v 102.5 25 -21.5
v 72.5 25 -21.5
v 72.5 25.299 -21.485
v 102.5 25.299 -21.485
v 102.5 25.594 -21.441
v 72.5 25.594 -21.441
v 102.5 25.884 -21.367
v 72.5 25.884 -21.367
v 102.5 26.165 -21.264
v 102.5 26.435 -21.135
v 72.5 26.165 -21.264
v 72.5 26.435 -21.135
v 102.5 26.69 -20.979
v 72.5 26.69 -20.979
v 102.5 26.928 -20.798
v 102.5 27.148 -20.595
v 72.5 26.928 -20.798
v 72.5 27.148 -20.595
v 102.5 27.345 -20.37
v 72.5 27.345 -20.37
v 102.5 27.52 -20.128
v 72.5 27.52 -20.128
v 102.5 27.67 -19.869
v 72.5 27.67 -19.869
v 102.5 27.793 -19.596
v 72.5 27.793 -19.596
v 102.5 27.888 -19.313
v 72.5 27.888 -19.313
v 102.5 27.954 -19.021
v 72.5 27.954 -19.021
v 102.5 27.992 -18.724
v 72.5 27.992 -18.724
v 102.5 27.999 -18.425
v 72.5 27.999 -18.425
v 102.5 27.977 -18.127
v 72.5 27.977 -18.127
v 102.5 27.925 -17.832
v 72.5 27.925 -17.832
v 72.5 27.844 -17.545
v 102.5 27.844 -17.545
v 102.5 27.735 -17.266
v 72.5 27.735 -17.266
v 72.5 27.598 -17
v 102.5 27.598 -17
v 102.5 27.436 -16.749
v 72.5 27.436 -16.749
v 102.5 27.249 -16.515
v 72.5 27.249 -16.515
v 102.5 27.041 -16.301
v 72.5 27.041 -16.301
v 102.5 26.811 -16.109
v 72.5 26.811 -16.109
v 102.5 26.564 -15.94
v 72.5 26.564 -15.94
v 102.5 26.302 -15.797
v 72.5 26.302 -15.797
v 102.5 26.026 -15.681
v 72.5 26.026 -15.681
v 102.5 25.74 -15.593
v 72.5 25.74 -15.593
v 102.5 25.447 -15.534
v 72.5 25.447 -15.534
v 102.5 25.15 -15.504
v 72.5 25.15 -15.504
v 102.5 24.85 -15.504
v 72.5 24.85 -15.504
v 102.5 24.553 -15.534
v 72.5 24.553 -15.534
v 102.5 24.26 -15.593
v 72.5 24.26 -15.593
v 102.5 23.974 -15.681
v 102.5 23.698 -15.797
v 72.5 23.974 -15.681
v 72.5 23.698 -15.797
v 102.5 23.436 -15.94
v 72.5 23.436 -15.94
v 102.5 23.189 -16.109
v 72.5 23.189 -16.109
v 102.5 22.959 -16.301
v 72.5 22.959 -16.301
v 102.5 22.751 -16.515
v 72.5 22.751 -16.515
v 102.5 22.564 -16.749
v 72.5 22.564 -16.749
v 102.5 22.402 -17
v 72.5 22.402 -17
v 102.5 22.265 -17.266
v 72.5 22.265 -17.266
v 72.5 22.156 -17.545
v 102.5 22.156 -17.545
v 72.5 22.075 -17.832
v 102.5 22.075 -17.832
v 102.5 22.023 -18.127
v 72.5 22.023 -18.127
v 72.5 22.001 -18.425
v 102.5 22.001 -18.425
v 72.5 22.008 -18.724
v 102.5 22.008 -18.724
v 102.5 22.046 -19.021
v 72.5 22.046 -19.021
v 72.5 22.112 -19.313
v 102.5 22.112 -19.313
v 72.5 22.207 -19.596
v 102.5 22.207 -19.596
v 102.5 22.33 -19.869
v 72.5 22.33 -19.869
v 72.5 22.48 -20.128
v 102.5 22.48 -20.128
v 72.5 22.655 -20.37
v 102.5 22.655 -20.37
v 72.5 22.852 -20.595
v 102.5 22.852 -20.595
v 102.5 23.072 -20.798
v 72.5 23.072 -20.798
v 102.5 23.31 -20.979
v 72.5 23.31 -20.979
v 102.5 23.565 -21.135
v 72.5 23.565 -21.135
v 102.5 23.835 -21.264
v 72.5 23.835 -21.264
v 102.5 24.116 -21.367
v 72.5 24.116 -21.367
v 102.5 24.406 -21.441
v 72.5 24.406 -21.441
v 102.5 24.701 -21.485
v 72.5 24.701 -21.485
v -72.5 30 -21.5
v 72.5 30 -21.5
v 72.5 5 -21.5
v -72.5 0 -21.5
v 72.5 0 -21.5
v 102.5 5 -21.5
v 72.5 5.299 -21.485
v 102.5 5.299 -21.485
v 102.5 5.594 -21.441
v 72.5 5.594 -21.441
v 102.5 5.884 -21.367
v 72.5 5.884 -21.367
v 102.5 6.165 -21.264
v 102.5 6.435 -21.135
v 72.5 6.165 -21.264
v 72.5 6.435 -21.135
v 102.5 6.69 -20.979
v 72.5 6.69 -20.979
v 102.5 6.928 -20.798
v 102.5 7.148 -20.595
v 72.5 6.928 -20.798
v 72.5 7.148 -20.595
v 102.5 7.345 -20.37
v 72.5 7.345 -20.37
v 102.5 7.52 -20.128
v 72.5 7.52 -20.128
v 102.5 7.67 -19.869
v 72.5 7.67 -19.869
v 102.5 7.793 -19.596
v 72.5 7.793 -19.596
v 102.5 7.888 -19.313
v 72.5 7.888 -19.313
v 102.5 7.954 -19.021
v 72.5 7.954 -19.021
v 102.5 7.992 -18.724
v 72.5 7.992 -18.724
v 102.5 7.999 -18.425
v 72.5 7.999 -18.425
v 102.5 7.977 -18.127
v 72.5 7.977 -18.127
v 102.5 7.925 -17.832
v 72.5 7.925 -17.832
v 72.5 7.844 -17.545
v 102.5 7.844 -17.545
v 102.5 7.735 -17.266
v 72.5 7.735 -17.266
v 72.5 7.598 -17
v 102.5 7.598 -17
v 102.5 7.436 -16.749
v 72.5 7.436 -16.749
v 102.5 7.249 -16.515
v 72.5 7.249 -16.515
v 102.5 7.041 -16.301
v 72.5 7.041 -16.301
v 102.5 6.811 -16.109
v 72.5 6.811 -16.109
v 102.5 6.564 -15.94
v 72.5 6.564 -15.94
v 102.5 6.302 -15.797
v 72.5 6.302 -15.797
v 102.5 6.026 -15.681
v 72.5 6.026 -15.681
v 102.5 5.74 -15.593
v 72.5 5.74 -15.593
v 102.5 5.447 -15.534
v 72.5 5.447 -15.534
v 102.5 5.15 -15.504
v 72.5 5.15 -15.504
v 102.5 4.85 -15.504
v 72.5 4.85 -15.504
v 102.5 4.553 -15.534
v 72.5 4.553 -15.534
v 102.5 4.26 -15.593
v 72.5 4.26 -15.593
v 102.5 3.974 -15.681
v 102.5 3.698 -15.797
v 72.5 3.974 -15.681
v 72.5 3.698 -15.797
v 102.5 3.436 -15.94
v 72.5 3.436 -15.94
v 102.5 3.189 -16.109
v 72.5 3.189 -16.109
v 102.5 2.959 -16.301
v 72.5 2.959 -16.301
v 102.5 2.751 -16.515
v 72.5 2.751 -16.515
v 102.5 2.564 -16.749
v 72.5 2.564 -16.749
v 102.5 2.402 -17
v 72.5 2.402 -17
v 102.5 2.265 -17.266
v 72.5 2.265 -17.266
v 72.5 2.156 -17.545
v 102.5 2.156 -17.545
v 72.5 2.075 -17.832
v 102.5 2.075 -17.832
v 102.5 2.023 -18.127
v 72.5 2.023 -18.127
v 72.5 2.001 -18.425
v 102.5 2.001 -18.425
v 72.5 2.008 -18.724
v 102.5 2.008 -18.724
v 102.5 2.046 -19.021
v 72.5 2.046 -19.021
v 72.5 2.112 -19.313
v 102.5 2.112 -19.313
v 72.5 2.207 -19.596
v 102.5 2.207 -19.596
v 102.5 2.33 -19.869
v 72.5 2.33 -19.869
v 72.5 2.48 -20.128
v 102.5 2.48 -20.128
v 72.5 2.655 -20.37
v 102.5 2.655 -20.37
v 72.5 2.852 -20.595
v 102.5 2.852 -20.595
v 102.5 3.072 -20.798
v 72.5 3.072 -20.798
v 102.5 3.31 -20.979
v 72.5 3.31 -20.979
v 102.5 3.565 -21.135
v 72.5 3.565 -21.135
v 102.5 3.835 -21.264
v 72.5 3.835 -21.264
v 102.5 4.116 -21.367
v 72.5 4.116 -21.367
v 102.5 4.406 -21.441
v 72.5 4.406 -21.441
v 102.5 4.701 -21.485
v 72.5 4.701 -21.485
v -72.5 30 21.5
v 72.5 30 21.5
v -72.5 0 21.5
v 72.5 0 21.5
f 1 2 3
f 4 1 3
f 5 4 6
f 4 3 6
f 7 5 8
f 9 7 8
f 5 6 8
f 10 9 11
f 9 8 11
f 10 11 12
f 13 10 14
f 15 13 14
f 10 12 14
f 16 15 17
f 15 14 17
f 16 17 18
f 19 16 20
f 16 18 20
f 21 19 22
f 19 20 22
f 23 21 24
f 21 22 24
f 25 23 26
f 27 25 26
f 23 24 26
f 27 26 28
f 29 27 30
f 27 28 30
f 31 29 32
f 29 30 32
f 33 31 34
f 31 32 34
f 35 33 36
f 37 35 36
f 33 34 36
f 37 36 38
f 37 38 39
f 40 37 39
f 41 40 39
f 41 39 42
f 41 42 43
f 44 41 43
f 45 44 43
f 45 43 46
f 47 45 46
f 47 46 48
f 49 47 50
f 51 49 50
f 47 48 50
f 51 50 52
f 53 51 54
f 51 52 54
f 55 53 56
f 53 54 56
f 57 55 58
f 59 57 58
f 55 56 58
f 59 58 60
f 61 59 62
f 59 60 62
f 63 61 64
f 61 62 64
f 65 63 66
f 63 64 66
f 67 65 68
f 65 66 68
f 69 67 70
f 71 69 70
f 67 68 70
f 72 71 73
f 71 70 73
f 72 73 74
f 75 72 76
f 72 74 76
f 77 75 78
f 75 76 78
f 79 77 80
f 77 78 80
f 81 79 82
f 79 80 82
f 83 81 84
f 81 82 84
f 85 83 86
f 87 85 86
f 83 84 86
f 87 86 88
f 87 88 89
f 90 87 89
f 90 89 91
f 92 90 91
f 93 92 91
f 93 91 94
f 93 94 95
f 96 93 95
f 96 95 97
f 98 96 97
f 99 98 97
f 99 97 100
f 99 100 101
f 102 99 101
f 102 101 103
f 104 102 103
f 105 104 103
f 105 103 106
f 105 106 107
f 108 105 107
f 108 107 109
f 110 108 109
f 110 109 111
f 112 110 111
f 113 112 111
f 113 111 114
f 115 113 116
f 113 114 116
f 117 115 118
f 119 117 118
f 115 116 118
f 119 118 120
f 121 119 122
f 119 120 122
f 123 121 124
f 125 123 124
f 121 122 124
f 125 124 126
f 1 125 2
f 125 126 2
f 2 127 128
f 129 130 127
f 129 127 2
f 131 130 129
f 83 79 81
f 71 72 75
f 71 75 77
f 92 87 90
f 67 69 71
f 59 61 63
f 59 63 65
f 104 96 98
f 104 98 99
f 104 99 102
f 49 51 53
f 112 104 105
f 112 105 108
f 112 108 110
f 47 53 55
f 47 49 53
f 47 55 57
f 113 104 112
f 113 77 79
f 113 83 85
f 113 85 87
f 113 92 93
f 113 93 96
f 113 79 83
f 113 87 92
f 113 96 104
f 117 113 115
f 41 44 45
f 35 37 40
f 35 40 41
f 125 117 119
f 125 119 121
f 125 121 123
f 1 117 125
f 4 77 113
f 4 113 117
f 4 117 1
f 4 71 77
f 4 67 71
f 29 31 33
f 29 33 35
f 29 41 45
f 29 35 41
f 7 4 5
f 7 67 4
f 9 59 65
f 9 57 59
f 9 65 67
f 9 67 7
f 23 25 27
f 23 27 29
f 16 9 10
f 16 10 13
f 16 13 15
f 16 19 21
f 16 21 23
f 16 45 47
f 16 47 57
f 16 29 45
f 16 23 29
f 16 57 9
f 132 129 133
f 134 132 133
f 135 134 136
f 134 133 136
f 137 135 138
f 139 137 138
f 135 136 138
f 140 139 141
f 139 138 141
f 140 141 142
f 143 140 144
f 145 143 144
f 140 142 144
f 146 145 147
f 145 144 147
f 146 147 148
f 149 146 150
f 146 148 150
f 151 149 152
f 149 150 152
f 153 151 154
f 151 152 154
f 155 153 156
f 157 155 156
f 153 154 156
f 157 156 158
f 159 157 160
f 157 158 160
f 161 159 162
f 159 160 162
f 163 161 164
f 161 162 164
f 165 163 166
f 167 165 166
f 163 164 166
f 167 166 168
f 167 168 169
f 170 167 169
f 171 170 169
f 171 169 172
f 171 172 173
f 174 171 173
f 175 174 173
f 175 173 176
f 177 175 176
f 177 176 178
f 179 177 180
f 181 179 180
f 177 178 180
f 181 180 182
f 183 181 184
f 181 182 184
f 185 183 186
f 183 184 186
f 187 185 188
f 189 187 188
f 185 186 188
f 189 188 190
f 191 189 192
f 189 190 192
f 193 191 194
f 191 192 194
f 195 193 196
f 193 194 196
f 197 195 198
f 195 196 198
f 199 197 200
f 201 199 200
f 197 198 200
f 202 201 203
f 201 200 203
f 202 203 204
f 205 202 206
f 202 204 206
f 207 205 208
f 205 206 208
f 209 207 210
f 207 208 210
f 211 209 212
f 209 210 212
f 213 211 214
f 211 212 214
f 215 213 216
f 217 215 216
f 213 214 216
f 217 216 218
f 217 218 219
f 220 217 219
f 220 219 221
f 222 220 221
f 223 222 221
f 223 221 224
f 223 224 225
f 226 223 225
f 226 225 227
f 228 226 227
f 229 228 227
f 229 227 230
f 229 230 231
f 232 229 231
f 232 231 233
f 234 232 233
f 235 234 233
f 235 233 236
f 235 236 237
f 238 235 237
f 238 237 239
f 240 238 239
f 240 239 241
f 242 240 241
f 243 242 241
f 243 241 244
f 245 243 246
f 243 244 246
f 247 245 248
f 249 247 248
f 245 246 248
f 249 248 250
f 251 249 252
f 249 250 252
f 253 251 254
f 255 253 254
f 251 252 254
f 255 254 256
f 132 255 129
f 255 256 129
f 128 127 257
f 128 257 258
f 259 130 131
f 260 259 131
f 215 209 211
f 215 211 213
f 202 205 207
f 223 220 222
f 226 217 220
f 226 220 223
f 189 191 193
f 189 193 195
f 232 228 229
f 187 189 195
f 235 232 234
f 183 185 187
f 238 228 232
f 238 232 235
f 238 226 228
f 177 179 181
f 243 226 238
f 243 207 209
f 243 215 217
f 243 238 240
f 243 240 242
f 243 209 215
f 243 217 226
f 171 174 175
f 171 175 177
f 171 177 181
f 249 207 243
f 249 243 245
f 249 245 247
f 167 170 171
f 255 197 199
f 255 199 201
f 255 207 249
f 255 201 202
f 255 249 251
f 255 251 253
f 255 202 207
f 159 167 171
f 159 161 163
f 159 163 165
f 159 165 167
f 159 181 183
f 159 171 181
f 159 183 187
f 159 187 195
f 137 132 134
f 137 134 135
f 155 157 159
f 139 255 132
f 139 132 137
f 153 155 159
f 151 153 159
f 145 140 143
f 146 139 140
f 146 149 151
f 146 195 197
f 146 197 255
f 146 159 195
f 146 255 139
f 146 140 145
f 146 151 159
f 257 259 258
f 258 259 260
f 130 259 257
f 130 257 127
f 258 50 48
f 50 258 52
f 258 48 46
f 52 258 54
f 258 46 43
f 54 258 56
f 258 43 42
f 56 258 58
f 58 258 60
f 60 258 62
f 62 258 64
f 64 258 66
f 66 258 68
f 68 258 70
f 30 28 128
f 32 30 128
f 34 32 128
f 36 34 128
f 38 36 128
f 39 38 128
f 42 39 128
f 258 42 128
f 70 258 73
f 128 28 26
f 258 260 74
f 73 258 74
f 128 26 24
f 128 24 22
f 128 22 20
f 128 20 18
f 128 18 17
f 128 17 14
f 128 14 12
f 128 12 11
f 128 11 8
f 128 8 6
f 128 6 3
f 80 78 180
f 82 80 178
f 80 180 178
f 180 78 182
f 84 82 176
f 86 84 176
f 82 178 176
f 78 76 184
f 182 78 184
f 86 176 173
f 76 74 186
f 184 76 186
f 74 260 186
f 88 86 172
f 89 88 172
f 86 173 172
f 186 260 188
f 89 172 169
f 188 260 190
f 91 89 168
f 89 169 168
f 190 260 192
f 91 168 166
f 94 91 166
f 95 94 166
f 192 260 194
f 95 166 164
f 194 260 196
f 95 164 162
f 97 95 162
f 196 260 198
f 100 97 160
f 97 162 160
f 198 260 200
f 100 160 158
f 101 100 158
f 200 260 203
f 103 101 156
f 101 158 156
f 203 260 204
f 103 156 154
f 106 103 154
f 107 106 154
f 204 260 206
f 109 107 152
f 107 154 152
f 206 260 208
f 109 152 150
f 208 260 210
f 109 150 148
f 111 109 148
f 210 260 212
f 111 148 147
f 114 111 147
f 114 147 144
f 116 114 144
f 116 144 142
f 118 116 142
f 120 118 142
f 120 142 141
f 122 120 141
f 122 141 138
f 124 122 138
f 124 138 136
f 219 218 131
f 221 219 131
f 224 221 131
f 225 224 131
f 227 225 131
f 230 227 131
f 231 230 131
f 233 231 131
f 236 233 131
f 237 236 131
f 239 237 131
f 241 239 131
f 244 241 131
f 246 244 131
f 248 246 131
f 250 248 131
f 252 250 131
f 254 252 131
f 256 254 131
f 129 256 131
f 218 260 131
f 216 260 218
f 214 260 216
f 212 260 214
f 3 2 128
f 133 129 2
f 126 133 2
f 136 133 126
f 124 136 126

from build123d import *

# Parameters (mm, degrees)
SKETCH1_W           = 145
SKETCH1_H           = 43
BOSS_EXTRUDE1_DEPTH = 30
SKETCH2_R           = 3
BOSS_EXTRUDE2_DEPTH = 30


with BuildPart() as part:
    # Sketch1 → Boss-Extrude1 (new body)
    with BuildSketch(Plane(origin=(0, 0, 0), x_dir=(1, 0, 0), z_dir=(0, 1, 0))):
        Rectangle(SKETCH1_W, SKETCH1_H)
    extrude(amount=BOSS_EXTRUDE1_DEPTH)

    # Sketch2 → Boss-Extrude2 (add)
    with BuildSketch(Plane(origin=(72.5, 0, 0), x_dir=(0, 0, -1), z_dir=(1, 0, 0))):
        with Locations((18.5, 25)):
            Circle(SKETCH2_R)
        with Locations((18.5, 5)):
            Circle(SKETCH2_R)
    extrude(amount=BOSS_EXTRUDE2_DEPTH)


solid = part.part
